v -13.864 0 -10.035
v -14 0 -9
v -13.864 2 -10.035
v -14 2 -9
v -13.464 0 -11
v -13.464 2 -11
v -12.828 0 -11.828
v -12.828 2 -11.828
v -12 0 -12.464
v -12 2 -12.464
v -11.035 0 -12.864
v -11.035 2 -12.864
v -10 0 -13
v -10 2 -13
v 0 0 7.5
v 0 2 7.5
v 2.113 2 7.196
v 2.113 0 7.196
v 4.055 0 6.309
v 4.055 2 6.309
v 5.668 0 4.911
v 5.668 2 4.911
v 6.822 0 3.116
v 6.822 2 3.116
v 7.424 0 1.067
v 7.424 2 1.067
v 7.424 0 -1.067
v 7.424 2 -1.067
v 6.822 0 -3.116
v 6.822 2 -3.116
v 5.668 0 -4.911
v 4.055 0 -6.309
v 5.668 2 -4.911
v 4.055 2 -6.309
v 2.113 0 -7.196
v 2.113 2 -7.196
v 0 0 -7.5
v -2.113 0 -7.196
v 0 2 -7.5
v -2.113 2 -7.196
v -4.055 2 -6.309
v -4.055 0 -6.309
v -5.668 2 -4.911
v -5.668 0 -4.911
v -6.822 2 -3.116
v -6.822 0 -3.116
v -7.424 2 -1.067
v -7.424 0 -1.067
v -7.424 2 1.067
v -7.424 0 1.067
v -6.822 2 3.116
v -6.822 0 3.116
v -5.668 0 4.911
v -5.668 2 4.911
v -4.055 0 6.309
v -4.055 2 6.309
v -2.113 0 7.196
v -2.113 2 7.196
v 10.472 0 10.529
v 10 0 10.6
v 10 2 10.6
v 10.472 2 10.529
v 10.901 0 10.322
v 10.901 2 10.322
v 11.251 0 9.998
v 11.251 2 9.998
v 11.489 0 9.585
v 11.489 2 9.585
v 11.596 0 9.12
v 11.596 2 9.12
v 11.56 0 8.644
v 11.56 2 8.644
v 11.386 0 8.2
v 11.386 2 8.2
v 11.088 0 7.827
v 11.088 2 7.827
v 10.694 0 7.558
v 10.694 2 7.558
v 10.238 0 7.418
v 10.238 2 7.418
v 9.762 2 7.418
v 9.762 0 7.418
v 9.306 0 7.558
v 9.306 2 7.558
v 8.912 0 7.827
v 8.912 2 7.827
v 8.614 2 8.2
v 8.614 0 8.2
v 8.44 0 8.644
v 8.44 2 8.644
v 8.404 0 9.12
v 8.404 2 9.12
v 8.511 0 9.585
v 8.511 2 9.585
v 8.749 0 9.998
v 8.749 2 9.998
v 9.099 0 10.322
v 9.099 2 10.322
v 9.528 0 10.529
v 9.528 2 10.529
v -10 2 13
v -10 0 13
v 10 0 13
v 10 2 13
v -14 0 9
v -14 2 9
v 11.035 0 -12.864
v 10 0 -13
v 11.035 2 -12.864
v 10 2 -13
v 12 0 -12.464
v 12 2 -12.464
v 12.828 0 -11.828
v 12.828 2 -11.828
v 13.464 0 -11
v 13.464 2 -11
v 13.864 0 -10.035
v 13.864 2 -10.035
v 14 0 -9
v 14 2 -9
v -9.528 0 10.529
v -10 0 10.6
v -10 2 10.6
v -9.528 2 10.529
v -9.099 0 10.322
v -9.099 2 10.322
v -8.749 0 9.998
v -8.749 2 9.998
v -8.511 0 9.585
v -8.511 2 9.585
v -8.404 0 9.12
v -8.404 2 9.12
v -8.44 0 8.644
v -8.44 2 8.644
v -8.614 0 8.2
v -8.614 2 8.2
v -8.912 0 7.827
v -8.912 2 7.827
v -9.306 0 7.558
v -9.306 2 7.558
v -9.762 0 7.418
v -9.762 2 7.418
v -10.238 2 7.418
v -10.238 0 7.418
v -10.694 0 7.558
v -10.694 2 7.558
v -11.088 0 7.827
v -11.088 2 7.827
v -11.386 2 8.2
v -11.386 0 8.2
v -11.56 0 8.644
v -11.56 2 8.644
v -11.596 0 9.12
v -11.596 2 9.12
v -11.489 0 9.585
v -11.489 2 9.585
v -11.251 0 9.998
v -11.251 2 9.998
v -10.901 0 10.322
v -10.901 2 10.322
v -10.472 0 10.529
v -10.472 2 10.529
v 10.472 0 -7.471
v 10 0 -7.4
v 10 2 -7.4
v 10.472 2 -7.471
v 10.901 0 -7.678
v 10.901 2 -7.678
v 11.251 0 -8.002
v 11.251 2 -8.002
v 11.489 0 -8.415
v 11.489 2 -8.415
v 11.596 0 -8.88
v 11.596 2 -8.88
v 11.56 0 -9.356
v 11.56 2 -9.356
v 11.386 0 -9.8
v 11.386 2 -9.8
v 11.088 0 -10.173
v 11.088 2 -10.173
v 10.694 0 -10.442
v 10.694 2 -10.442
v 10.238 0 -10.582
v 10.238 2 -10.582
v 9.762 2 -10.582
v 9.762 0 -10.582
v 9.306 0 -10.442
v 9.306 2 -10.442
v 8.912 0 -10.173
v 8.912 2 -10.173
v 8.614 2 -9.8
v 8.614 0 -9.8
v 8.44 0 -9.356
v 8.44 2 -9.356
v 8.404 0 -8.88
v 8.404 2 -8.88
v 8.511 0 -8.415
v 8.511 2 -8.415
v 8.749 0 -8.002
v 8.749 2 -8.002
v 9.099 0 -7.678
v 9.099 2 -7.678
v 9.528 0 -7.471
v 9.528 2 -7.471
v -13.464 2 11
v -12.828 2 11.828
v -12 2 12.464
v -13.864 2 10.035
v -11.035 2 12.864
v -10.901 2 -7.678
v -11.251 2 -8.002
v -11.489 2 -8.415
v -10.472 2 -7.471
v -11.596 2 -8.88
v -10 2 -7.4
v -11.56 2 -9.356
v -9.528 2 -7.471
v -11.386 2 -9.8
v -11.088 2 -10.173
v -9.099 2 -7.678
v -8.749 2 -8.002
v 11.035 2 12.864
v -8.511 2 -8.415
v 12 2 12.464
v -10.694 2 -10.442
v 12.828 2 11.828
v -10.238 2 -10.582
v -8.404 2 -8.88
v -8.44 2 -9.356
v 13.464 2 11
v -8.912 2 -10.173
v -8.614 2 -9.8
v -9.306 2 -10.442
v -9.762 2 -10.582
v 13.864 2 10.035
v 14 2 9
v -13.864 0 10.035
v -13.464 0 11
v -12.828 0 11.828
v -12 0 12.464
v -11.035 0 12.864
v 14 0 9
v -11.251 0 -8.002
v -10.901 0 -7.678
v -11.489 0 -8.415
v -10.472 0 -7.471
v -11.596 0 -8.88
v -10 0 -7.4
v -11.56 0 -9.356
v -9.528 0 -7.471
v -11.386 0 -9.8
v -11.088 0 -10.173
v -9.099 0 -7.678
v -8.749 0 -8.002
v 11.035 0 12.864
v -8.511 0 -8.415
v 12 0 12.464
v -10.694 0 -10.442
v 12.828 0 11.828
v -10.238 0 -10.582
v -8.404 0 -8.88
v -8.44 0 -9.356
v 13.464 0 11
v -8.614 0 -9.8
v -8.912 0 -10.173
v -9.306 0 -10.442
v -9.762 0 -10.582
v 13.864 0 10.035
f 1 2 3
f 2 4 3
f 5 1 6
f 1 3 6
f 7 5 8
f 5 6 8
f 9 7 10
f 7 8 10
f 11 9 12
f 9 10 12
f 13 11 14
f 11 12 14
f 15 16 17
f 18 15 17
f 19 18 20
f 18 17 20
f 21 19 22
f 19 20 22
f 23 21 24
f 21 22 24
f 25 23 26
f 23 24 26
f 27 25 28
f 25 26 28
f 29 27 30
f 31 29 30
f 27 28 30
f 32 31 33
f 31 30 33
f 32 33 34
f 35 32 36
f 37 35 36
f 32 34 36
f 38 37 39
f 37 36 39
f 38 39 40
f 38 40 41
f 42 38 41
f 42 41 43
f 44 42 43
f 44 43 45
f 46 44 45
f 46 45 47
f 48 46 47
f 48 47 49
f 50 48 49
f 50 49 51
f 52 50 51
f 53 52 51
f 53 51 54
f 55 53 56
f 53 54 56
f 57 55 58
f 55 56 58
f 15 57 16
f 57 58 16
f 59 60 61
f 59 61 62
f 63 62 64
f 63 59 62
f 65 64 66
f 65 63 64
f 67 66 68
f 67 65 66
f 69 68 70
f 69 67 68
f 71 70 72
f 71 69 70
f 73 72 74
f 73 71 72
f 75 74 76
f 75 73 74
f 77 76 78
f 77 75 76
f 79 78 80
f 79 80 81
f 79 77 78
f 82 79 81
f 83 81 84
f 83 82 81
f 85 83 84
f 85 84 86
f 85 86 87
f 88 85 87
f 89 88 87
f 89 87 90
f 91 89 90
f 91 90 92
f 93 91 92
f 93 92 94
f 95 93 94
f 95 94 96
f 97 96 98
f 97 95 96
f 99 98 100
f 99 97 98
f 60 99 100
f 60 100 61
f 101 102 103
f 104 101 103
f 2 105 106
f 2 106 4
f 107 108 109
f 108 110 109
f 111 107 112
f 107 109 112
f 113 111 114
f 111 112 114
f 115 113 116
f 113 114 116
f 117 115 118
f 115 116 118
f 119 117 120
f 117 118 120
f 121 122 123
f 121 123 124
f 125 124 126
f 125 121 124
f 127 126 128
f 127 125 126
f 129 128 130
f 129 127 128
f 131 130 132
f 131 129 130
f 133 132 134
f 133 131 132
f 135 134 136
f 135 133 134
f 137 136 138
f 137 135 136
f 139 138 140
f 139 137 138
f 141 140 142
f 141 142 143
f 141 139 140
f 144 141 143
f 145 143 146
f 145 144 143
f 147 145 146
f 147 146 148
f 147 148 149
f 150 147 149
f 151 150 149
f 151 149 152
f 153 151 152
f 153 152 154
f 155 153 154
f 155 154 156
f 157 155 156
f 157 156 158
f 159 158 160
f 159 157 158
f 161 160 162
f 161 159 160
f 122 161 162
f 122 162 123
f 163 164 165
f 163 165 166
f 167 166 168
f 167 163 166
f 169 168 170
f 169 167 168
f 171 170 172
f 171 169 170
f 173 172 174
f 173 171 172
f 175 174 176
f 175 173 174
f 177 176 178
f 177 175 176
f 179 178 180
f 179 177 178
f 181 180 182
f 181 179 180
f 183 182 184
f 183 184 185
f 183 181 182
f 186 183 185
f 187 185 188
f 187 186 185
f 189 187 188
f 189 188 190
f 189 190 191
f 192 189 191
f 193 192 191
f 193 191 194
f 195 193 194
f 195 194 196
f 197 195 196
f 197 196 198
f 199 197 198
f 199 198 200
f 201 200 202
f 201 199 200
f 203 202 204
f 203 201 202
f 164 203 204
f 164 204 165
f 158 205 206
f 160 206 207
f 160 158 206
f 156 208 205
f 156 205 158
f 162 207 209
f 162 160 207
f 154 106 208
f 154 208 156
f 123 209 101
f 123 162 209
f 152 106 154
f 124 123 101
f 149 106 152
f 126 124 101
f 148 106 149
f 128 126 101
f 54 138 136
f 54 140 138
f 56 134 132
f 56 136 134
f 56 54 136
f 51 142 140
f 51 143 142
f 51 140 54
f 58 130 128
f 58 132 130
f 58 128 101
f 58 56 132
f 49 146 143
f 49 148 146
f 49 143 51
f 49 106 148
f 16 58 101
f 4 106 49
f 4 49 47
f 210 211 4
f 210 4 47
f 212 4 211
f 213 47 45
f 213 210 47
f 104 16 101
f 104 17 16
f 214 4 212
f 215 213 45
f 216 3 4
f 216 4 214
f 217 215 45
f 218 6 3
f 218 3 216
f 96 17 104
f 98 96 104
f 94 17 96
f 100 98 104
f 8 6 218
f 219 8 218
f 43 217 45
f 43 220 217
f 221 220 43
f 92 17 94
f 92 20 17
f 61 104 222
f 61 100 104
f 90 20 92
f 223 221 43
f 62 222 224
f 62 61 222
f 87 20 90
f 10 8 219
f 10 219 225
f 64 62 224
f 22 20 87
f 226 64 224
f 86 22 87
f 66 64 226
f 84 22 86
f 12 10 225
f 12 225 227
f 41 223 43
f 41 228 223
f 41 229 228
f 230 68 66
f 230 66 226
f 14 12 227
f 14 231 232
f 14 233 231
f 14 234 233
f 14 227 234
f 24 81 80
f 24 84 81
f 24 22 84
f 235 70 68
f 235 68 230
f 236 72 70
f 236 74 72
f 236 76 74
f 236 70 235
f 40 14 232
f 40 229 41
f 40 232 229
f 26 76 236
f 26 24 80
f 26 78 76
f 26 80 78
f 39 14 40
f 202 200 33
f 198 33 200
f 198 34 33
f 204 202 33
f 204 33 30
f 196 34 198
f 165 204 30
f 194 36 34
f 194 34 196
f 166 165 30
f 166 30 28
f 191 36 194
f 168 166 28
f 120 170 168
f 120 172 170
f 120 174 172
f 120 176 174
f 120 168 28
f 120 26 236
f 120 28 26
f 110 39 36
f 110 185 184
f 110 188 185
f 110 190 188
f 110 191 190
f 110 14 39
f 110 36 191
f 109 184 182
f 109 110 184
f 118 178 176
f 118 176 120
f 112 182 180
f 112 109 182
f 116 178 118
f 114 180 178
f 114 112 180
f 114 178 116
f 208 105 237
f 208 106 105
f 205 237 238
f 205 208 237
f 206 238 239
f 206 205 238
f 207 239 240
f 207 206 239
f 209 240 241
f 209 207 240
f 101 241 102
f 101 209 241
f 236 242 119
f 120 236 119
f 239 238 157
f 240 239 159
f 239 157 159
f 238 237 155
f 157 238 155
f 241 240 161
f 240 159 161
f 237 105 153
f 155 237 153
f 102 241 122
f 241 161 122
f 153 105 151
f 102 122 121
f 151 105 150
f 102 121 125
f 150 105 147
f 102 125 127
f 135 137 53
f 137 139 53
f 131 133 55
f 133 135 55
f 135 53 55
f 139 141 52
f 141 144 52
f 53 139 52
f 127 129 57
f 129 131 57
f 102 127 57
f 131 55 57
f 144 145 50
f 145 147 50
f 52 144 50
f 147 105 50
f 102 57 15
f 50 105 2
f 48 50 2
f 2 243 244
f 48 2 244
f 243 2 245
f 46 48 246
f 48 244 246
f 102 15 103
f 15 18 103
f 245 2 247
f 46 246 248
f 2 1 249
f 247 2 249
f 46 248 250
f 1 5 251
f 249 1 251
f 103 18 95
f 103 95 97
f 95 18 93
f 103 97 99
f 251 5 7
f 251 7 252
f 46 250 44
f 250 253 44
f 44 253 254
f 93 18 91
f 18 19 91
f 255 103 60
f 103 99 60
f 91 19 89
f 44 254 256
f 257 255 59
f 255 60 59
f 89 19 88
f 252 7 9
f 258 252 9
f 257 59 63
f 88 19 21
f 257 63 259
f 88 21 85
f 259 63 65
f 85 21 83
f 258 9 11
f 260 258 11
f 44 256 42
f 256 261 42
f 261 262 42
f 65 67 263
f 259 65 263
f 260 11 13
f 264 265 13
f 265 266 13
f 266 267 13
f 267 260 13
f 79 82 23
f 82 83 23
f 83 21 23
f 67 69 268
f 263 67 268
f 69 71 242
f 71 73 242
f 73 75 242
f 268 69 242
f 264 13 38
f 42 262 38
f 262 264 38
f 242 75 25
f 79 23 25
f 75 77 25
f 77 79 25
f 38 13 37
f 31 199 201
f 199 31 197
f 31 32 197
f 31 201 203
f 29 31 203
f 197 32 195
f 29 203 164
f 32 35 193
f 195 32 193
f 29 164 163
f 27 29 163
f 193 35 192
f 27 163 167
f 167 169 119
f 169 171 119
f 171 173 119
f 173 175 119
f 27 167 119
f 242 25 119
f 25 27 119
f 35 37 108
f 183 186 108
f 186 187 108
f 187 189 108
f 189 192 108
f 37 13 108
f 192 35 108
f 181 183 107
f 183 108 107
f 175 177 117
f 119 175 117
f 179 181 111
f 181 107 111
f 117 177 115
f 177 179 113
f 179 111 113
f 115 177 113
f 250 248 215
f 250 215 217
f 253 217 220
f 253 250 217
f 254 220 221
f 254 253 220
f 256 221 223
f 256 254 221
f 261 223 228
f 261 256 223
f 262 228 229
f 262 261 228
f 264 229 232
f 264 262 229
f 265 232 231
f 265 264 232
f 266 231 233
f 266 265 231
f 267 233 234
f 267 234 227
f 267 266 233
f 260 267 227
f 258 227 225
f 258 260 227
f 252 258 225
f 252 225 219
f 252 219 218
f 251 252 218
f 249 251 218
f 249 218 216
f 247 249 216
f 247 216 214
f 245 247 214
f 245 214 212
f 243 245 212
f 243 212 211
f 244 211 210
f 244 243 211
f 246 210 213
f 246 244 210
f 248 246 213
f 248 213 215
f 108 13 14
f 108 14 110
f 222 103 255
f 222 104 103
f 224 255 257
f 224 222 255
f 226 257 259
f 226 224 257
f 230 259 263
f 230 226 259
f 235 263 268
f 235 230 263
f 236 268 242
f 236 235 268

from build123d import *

# Parameters (mm, degrees)
SKETCH_1_W          = 28
SKETCH_1_H          = 26
SKETCH_1_R          = 1.6
EXTRUDE_1_DEPTH     = 2
SKETCH_2_R          = 7.5
CUT_EXTRUDE_1_DEPTH = 2
FILLET_1_R          = 4


with BuildPart() as part:
    # 草图1 → 凸台-拉伸1 (new body)
    with BuildSketch(Plane(origin=(0, 0, 0), x_dir=(1, 0, 0), z_dir=(0, 1, 0))):
        Rectangle(SKETCH_1_W, SKETCH_1_H)
        with Locations(Location((10, -9, 0), (0, 0, 270))):
            Circle(SKETCH_1_R, mode=Mode.SUBTRACT)
        with Locations(Location((-10, -9, 0), (0, 0, 270))):
            Circle(SKETCH_1_R, mode=Mode.SUBTRACT)
        with Locations(Location((-10, 9, 0), (0, 0, 270))):
            Circle(SKETCH_1_R, mode=Mode.SUBTRACT)
        with Locations(Location((10, 9, 0), (0, 0, 270))):
            Circle(SKETCH_1_R, mode=Mode.SUBTRACT)
    extrude(amount=EXTRUDE_1_DEPTH)

    # 草图2 → 切除-拉伸1 (cut)
    with BuildSketch(Plane(origin=(0, 2, 0), x_dir=(1, 0, 0), z_dir=(0, 1, 0))):
        with Locations(Location((0, 0, 0), (0, 0, 270))):
            Circle(SKETCH_2_R)
    extrude(amount=-CUT_EXTRUDE_1_DEPTH, mode=Mode.SUBTRACT)

    # 圆角1
    fillet_1_edges = [part.edges().sort_by_distance(p)[0] for p in [
        (14, 1, 13),
        (-14, 1, 13),
        (-14, 1, -13),
        (14, 1, -13),
    ]]
    fillet(fillet_1_edges, radius=FILLET_1_R)


solid = part.part
